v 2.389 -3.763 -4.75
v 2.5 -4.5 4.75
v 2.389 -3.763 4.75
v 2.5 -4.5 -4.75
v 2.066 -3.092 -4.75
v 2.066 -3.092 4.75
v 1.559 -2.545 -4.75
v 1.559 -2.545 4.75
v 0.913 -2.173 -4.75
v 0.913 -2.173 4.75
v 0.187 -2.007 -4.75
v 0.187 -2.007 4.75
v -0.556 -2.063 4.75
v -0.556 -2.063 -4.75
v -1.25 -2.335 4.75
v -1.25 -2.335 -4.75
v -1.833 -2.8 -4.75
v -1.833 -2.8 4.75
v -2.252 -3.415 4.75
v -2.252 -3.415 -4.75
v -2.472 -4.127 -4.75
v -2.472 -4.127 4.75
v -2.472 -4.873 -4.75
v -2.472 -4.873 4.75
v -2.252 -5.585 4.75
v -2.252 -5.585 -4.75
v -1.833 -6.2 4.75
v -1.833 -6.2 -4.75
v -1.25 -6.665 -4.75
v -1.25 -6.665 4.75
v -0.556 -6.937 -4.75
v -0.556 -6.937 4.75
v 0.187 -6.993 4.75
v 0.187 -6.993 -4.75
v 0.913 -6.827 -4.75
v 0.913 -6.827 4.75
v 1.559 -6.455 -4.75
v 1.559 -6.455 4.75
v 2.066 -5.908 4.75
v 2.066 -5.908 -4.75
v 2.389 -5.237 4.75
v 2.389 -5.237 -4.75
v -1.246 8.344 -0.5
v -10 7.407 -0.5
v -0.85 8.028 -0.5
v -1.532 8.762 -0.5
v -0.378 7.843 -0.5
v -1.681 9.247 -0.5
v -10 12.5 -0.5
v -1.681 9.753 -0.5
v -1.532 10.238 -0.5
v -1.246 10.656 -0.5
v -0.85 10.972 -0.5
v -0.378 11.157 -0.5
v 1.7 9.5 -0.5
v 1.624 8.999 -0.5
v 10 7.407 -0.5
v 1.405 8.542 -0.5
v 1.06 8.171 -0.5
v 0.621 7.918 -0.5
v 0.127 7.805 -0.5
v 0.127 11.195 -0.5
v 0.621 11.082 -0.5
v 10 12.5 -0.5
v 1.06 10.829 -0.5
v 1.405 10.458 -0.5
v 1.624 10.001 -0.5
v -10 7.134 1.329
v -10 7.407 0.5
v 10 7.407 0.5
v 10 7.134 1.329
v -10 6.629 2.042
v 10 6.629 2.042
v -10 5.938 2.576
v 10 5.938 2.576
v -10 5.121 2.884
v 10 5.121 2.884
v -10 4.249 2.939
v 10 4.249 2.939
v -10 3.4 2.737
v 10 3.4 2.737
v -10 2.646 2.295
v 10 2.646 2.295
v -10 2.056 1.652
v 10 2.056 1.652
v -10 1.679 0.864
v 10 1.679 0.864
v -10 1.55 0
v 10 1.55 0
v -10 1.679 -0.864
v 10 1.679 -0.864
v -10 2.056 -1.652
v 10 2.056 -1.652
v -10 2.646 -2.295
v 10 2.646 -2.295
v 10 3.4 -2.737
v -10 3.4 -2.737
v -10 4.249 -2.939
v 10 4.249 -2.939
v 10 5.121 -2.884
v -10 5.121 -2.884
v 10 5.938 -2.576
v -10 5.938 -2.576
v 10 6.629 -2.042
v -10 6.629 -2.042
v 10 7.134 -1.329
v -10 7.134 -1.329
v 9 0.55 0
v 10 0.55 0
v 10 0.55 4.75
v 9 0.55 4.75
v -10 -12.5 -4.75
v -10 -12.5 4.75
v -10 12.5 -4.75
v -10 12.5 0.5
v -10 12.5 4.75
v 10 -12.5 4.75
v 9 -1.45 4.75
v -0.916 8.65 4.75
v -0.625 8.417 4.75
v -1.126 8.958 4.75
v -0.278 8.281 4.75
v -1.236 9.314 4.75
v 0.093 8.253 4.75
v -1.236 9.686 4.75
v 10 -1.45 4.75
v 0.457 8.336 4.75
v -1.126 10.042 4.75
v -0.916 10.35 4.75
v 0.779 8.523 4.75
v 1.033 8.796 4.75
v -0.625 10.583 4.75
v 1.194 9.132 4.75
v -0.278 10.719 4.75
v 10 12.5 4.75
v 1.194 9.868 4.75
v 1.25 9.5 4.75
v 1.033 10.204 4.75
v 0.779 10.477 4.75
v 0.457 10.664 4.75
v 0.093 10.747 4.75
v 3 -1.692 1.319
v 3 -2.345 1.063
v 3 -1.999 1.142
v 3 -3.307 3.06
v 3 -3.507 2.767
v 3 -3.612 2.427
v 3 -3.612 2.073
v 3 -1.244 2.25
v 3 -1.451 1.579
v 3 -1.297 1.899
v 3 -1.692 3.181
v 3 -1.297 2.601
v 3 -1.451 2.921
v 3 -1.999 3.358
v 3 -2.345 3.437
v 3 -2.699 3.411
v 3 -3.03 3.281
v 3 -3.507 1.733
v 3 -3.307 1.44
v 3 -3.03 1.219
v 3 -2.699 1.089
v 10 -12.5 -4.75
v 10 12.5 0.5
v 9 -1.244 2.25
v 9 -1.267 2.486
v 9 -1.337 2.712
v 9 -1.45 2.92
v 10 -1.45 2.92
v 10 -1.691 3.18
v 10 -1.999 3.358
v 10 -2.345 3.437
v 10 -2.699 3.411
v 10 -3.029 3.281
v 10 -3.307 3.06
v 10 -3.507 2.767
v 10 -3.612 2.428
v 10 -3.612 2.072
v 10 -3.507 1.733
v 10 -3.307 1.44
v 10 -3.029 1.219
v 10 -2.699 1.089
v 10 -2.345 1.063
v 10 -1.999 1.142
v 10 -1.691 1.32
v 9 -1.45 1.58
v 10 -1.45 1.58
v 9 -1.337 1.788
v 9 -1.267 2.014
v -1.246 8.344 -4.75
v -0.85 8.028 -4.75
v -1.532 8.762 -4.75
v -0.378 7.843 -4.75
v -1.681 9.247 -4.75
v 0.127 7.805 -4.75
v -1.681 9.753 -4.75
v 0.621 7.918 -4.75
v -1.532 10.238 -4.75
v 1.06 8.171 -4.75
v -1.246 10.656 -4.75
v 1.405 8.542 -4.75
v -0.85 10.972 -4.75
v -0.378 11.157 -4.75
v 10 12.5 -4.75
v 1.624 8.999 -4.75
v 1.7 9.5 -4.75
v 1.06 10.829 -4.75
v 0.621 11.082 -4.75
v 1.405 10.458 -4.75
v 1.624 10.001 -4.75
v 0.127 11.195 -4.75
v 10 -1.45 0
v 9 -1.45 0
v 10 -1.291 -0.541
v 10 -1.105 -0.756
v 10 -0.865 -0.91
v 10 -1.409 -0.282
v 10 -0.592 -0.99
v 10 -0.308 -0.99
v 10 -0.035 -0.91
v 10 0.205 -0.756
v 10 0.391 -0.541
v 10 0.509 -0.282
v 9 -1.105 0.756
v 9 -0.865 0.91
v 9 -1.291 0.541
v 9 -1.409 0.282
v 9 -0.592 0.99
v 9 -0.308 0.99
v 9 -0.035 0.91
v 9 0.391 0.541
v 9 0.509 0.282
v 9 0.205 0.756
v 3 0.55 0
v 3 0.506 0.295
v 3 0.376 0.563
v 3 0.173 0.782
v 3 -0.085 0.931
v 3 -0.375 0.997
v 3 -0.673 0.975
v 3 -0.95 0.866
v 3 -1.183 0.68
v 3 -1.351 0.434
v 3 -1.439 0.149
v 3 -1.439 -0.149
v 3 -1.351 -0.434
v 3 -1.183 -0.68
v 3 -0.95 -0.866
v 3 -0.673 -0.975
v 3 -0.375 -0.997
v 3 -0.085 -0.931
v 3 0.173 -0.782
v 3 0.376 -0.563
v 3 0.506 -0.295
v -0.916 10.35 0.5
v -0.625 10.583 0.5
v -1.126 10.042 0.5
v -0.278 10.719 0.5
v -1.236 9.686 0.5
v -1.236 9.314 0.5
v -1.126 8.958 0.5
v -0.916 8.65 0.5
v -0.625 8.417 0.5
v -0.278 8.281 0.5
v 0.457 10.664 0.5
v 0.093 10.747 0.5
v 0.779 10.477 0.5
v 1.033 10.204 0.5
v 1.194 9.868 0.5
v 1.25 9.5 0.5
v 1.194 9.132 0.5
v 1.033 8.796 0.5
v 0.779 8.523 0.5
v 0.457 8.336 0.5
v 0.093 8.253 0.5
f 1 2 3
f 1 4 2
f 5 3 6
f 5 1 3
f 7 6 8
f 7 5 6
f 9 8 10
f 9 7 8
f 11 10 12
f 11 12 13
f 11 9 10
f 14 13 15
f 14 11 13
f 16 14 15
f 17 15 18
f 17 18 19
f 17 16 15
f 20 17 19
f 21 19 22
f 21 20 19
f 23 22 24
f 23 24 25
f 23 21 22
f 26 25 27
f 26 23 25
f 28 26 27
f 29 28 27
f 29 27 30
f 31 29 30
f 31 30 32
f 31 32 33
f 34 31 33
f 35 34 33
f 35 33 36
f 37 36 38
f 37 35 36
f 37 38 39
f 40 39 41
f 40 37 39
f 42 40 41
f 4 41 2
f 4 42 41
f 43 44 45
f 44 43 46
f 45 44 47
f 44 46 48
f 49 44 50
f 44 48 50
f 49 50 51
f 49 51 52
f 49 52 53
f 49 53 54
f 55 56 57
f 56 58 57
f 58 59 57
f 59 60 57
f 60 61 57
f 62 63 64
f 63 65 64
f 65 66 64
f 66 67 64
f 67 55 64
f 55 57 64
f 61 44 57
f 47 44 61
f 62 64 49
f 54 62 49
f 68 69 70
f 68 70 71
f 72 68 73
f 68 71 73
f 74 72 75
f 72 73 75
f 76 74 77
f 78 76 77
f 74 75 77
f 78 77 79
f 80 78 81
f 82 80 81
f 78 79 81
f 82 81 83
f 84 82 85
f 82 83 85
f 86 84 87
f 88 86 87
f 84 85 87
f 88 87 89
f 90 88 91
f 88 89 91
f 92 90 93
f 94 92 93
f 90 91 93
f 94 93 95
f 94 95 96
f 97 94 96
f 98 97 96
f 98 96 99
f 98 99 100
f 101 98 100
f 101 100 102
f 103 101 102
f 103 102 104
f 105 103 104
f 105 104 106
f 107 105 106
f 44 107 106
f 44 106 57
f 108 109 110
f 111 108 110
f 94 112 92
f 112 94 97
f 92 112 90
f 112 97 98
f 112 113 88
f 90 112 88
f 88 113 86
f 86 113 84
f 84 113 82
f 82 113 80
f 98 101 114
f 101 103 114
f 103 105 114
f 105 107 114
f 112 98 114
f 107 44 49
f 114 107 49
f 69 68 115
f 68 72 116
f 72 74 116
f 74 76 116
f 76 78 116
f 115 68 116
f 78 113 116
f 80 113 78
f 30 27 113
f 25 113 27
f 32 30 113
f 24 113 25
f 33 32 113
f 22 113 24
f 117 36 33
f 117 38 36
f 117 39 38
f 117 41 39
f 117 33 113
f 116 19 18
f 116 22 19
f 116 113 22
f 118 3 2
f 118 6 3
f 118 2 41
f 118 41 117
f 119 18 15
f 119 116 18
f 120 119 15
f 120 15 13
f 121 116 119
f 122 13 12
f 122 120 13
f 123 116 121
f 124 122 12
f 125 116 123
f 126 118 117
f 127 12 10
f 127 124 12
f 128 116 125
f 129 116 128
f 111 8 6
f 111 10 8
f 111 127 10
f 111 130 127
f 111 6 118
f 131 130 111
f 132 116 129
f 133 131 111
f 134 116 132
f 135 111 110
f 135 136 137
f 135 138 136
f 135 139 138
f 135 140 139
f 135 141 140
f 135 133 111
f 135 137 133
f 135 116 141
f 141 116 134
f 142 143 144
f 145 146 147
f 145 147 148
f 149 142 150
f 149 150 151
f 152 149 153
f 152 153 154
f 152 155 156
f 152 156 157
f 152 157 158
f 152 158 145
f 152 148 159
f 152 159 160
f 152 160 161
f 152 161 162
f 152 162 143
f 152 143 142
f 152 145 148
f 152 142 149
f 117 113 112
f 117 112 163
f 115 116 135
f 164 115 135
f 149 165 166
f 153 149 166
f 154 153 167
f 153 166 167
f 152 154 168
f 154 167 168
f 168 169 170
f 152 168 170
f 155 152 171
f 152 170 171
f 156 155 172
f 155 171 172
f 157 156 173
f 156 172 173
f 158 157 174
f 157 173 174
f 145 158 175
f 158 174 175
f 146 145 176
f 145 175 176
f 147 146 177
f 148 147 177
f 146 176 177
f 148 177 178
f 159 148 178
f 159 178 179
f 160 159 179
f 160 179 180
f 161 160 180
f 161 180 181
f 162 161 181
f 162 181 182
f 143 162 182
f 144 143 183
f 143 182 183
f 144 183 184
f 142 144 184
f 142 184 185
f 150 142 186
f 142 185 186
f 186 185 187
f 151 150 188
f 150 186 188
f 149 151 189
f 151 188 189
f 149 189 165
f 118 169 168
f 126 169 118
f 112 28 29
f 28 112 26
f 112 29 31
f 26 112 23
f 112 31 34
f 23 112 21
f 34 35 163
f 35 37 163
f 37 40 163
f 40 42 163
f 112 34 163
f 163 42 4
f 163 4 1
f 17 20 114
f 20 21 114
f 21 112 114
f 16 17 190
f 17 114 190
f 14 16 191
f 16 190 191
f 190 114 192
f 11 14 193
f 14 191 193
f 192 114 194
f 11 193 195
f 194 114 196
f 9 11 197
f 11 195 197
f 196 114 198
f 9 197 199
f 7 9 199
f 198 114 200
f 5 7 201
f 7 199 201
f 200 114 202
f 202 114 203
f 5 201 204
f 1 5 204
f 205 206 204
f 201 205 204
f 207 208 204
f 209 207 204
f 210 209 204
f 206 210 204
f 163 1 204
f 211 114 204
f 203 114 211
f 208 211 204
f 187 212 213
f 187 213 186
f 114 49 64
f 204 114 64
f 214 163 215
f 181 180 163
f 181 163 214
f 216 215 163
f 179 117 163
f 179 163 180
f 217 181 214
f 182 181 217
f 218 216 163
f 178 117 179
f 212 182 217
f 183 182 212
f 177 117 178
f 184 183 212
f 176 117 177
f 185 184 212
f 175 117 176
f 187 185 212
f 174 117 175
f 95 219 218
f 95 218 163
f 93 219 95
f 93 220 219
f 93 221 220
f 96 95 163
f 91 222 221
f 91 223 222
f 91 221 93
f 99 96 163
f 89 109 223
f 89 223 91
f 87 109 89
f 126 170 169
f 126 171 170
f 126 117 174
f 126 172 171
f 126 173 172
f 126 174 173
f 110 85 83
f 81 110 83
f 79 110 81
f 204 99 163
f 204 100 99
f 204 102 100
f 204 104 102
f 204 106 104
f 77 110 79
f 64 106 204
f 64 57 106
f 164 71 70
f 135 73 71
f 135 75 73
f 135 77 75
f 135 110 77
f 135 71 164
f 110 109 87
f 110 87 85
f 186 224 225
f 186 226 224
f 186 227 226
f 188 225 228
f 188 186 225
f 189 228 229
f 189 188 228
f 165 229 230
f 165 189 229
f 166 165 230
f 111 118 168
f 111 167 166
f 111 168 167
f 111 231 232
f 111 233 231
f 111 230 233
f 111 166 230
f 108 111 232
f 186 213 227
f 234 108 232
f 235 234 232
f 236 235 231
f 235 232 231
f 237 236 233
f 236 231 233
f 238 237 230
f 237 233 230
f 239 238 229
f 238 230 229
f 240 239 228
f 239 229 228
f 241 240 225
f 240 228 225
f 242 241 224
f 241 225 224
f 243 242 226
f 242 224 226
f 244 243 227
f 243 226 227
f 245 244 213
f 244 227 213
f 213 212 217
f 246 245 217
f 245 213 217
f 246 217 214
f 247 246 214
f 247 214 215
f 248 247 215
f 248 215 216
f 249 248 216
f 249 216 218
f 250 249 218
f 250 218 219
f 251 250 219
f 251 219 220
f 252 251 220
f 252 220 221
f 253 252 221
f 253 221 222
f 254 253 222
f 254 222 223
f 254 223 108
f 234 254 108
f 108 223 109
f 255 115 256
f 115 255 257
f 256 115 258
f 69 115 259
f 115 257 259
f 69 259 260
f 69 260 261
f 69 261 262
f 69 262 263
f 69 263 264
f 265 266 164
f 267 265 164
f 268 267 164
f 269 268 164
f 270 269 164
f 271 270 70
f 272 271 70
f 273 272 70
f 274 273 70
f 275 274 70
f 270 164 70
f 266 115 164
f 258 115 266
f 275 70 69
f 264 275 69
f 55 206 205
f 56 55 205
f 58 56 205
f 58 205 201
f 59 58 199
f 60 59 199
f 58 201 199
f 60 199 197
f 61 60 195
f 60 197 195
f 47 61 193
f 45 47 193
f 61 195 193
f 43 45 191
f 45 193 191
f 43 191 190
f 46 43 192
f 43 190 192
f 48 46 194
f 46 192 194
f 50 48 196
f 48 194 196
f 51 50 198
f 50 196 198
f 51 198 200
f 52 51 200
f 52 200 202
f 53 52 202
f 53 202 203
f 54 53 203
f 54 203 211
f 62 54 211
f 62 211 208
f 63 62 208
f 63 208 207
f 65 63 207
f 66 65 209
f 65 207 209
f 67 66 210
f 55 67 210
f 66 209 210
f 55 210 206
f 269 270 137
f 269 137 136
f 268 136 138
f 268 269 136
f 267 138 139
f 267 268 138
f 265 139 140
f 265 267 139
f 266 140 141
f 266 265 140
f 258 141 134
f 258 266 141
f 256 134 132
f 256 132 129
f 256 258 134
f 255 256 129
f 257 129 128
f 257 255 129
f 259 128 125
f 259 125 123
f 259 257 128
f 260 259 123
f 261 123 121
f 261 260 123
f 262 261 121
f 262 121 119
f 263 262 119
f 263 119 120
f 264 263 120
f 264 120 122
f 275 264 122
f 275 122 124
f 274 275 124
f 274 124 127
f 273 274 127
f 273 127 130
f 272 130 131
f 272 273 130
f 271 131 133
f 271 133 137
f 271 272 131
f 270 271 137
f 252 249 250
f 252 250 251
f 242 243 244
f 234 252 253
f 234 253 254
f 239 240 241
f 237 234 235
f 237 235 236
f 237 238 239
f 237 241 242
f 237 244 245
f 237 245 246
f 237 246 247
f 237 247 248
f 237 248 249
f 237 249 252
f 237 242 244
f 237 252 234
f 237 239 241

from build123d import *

# Parameters (mm, degrees)
F0_W     = 20
F0_H     = 25
F0_R     = 2.5
F0_R_2   = 1.25
F1_DEPTH = 4.75
F3_DEPTH = 20.001
F4_R     = 1.7
F5_DEPTH = 4.25
F6_R     = 1
F6_R_2   = 1.190625
F7_DEPTH = 7
F8_W     = 2
F8_H     = 4.7499998814
F9_DEPTH = 1


with BuildPart() as f1:
    # F0 (on Top) → F1 (new body, symmetric)
    with BuildSketch(Plane.XY):
        Rectangle(F0_W, F0_H)
        with Locations((0, -4.5)):
            Circle(F0_R, mode=Mode.SUBTRACT)
        with Locations((0, 9.5)):
            Circle(F0_R_2, mode=Mode.SUBTRACT)
    extrude(amount=F1_DEPTH, both=True)

    # F2 (on face) → F3 (cut, through all)
    with BuildSketch(Plane.YZ.offset(10)):
        with BuildLine():
            ThreePointArc((7.407318352, -0.5), (7.43931022, -0.2509092082), (7.45, 0))
            ThreePointArc((7.45, 0), (7.43931022, 0.2509092082), (7.407318352, 0.5))
            Line((7.407318352, 0.5), (7.407318352, -0.5))
        make_face()
        with BuildLine():
            ThreePointArc((7.407318352, 0.5), (7.43931022, 0.2509092082), (7.45, 0))
            ThreePointArc((7.45, 0), (7.43931022, -0.2509092082), (7.407318352, -0.5))
            Line((7.407318352, -0.5), (12.5, -0.5))
            Line((12.5, -0.5), (12.5, 0.5))
            Line((12.5, 0.5), (7.407318352, 0.5))
        make_face()
        with BuildLine():
            Line((7.407318352, -0.5), (7.407318352, 0.5))
            ThreePointArc((7.407318352, 0.5), (1.55, 0), (7.407318352, -0.5))
        make_face()
    extrude(amount=-F3_DEPTH, mode=Mode.SUBTRACT)

    # F4 (on face) → F5 (cut, through all)
    with BuildSketch(Plane(origin=(0, 0, -4.75), x_dir=(1, 0, 0), z_dir=(0, 0, -1))):
        with Locations((0, -9.5)):
            Circle(F4_R)
    extrude(amount=-F5_DEPTH, mode=Mode.SUBTRACT)

    # F6 (on face) → F7 (cut)
    with BuildSketch(Plane.YZ.offset(10)):
        with Locations((-0.45, 0)):
            Circle(F6_R)
        with Locations((-2.4343134833, 2.25)):
            Circle(F6_R_2)
    extrude(amount=-F7_DEPTH, mode=Mode.SUBTRACT)

    # F8 (on face) → F9 (cut)
    with BuildSketch(Plane.YZ.offset(10)):
        with Locations((-0.45, 2.3750000593)):
            Rectangle(F8_W, F8_H)
    extrude(amount=-F9_DEPTH, mode=Mode.SUBTRACT)


solid = f1.part
